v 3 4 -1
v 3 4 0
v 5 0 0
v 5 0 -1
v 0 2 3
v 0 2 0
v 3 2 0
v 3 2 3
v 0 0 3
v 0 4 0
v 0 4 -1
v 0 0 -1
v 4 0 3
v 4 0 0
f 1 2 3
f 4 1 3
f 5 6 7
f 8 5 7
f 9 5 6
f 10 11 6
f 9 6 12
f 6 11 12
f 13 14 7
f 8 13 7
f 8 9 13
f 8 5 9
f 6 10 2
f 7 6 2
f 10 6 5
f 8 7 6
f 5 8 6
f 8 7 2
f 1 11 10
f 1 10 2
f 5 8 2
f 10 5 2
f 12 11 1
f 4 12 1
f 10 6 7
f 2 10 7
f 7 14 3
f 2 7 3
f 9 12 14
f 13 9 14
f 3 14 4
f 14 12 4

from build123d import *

# Parameters (mm, degrees)
SKETCH1_W           = 3
SKETCH1_H           = 1
BOSS_EXTRUDE1_DEPTH = 4
SKETCH2_W           = 2
SKETCH2_H           = 1
BOSS_EXTRUDE3_DEPTH = 4
CUT_EXTRUDE3_DEPTH  = 4
BOSS_EXTRUDE4_DEPTH = 3
SKETCH5_W           = 3
SKETCH5_H           = 2
BOSS_EXTRUDE6_DEPTH = 3
CUT_EXTRUDE4_DEPTH  = 3


with BuildPart() as part:
    # Sketch1 → Boss-Extrude1 (new body)
    with BuildSketch(Plane(origin=(0, 0, 0), x_dir=(1, 0, 0), z_dir=(0, 1, 0))):
        with Locations((1.5, 0.5)):
            Rectangle(SKETCH1_W, SKETCH1_H)
    extrude(amount=BOSS_EXTRUDE1_DEPTH)



with BuildPart() as body_2:
    # Sketch2 → Boss-Extrude3 (new body)
    with BuildSketch(Plane.XZ):
        with Locations((4, -0.5)):
            Rectangle(SKETCH2_W, SKETCH2_H)
    extrude(amount=-BOSS_EXTRUDE3_DEPTH)

    # Sketch3 → Cut-Extrude3 (cut)
    with BuildSketch(Plane.XY):
        Polygon((3, 4), (5, 0), (5, 4), align=None)
    extrude(amount=-CUT_EXTRUDE3_DEPTH, mode=Mode.SUBTRACT)


with BuildPart() as part_1:
    add(part.part)

    add(body_2.part)  # Boss-Extrude4 merges body 2
    # Sketch4 → Boss-Extrude4 (add)
    with BuildSketch(Plane.XY):
        Polygon((0, 0), (4, 0), (3, 2), (0, 2), align=None)
    extrude(amount=BOSS_EXTRUDE4_DEPTH)


with BuildPart() as body_2_2:
    # Sketch5 → Boss-Extrude6 (new body)
    with BuildSketch(Plane.XY):
        with Locations((1.5, 3)):
            Rectangle(SKETCH5_W, SKETCH5_H)
    extrude(amount=BOSS_EXTRUDE6_DEPTH)

    # Sketch6 → Cut-Extrude4 (cut)
    with BuildSketch(Plane(origin=(3, 0, 0), x_dir=(0, 0, -1), z_dir=(1, 0, 0))):
        Polygon((-3, 2), (0, 4), (-3, 4), align=None)
    extrude(amount=-CUT_EXTRUDE4_DEPTH, mode=Mode.SUBTRACT)


solid = Compound([part_1.part, body_2_2.part])
